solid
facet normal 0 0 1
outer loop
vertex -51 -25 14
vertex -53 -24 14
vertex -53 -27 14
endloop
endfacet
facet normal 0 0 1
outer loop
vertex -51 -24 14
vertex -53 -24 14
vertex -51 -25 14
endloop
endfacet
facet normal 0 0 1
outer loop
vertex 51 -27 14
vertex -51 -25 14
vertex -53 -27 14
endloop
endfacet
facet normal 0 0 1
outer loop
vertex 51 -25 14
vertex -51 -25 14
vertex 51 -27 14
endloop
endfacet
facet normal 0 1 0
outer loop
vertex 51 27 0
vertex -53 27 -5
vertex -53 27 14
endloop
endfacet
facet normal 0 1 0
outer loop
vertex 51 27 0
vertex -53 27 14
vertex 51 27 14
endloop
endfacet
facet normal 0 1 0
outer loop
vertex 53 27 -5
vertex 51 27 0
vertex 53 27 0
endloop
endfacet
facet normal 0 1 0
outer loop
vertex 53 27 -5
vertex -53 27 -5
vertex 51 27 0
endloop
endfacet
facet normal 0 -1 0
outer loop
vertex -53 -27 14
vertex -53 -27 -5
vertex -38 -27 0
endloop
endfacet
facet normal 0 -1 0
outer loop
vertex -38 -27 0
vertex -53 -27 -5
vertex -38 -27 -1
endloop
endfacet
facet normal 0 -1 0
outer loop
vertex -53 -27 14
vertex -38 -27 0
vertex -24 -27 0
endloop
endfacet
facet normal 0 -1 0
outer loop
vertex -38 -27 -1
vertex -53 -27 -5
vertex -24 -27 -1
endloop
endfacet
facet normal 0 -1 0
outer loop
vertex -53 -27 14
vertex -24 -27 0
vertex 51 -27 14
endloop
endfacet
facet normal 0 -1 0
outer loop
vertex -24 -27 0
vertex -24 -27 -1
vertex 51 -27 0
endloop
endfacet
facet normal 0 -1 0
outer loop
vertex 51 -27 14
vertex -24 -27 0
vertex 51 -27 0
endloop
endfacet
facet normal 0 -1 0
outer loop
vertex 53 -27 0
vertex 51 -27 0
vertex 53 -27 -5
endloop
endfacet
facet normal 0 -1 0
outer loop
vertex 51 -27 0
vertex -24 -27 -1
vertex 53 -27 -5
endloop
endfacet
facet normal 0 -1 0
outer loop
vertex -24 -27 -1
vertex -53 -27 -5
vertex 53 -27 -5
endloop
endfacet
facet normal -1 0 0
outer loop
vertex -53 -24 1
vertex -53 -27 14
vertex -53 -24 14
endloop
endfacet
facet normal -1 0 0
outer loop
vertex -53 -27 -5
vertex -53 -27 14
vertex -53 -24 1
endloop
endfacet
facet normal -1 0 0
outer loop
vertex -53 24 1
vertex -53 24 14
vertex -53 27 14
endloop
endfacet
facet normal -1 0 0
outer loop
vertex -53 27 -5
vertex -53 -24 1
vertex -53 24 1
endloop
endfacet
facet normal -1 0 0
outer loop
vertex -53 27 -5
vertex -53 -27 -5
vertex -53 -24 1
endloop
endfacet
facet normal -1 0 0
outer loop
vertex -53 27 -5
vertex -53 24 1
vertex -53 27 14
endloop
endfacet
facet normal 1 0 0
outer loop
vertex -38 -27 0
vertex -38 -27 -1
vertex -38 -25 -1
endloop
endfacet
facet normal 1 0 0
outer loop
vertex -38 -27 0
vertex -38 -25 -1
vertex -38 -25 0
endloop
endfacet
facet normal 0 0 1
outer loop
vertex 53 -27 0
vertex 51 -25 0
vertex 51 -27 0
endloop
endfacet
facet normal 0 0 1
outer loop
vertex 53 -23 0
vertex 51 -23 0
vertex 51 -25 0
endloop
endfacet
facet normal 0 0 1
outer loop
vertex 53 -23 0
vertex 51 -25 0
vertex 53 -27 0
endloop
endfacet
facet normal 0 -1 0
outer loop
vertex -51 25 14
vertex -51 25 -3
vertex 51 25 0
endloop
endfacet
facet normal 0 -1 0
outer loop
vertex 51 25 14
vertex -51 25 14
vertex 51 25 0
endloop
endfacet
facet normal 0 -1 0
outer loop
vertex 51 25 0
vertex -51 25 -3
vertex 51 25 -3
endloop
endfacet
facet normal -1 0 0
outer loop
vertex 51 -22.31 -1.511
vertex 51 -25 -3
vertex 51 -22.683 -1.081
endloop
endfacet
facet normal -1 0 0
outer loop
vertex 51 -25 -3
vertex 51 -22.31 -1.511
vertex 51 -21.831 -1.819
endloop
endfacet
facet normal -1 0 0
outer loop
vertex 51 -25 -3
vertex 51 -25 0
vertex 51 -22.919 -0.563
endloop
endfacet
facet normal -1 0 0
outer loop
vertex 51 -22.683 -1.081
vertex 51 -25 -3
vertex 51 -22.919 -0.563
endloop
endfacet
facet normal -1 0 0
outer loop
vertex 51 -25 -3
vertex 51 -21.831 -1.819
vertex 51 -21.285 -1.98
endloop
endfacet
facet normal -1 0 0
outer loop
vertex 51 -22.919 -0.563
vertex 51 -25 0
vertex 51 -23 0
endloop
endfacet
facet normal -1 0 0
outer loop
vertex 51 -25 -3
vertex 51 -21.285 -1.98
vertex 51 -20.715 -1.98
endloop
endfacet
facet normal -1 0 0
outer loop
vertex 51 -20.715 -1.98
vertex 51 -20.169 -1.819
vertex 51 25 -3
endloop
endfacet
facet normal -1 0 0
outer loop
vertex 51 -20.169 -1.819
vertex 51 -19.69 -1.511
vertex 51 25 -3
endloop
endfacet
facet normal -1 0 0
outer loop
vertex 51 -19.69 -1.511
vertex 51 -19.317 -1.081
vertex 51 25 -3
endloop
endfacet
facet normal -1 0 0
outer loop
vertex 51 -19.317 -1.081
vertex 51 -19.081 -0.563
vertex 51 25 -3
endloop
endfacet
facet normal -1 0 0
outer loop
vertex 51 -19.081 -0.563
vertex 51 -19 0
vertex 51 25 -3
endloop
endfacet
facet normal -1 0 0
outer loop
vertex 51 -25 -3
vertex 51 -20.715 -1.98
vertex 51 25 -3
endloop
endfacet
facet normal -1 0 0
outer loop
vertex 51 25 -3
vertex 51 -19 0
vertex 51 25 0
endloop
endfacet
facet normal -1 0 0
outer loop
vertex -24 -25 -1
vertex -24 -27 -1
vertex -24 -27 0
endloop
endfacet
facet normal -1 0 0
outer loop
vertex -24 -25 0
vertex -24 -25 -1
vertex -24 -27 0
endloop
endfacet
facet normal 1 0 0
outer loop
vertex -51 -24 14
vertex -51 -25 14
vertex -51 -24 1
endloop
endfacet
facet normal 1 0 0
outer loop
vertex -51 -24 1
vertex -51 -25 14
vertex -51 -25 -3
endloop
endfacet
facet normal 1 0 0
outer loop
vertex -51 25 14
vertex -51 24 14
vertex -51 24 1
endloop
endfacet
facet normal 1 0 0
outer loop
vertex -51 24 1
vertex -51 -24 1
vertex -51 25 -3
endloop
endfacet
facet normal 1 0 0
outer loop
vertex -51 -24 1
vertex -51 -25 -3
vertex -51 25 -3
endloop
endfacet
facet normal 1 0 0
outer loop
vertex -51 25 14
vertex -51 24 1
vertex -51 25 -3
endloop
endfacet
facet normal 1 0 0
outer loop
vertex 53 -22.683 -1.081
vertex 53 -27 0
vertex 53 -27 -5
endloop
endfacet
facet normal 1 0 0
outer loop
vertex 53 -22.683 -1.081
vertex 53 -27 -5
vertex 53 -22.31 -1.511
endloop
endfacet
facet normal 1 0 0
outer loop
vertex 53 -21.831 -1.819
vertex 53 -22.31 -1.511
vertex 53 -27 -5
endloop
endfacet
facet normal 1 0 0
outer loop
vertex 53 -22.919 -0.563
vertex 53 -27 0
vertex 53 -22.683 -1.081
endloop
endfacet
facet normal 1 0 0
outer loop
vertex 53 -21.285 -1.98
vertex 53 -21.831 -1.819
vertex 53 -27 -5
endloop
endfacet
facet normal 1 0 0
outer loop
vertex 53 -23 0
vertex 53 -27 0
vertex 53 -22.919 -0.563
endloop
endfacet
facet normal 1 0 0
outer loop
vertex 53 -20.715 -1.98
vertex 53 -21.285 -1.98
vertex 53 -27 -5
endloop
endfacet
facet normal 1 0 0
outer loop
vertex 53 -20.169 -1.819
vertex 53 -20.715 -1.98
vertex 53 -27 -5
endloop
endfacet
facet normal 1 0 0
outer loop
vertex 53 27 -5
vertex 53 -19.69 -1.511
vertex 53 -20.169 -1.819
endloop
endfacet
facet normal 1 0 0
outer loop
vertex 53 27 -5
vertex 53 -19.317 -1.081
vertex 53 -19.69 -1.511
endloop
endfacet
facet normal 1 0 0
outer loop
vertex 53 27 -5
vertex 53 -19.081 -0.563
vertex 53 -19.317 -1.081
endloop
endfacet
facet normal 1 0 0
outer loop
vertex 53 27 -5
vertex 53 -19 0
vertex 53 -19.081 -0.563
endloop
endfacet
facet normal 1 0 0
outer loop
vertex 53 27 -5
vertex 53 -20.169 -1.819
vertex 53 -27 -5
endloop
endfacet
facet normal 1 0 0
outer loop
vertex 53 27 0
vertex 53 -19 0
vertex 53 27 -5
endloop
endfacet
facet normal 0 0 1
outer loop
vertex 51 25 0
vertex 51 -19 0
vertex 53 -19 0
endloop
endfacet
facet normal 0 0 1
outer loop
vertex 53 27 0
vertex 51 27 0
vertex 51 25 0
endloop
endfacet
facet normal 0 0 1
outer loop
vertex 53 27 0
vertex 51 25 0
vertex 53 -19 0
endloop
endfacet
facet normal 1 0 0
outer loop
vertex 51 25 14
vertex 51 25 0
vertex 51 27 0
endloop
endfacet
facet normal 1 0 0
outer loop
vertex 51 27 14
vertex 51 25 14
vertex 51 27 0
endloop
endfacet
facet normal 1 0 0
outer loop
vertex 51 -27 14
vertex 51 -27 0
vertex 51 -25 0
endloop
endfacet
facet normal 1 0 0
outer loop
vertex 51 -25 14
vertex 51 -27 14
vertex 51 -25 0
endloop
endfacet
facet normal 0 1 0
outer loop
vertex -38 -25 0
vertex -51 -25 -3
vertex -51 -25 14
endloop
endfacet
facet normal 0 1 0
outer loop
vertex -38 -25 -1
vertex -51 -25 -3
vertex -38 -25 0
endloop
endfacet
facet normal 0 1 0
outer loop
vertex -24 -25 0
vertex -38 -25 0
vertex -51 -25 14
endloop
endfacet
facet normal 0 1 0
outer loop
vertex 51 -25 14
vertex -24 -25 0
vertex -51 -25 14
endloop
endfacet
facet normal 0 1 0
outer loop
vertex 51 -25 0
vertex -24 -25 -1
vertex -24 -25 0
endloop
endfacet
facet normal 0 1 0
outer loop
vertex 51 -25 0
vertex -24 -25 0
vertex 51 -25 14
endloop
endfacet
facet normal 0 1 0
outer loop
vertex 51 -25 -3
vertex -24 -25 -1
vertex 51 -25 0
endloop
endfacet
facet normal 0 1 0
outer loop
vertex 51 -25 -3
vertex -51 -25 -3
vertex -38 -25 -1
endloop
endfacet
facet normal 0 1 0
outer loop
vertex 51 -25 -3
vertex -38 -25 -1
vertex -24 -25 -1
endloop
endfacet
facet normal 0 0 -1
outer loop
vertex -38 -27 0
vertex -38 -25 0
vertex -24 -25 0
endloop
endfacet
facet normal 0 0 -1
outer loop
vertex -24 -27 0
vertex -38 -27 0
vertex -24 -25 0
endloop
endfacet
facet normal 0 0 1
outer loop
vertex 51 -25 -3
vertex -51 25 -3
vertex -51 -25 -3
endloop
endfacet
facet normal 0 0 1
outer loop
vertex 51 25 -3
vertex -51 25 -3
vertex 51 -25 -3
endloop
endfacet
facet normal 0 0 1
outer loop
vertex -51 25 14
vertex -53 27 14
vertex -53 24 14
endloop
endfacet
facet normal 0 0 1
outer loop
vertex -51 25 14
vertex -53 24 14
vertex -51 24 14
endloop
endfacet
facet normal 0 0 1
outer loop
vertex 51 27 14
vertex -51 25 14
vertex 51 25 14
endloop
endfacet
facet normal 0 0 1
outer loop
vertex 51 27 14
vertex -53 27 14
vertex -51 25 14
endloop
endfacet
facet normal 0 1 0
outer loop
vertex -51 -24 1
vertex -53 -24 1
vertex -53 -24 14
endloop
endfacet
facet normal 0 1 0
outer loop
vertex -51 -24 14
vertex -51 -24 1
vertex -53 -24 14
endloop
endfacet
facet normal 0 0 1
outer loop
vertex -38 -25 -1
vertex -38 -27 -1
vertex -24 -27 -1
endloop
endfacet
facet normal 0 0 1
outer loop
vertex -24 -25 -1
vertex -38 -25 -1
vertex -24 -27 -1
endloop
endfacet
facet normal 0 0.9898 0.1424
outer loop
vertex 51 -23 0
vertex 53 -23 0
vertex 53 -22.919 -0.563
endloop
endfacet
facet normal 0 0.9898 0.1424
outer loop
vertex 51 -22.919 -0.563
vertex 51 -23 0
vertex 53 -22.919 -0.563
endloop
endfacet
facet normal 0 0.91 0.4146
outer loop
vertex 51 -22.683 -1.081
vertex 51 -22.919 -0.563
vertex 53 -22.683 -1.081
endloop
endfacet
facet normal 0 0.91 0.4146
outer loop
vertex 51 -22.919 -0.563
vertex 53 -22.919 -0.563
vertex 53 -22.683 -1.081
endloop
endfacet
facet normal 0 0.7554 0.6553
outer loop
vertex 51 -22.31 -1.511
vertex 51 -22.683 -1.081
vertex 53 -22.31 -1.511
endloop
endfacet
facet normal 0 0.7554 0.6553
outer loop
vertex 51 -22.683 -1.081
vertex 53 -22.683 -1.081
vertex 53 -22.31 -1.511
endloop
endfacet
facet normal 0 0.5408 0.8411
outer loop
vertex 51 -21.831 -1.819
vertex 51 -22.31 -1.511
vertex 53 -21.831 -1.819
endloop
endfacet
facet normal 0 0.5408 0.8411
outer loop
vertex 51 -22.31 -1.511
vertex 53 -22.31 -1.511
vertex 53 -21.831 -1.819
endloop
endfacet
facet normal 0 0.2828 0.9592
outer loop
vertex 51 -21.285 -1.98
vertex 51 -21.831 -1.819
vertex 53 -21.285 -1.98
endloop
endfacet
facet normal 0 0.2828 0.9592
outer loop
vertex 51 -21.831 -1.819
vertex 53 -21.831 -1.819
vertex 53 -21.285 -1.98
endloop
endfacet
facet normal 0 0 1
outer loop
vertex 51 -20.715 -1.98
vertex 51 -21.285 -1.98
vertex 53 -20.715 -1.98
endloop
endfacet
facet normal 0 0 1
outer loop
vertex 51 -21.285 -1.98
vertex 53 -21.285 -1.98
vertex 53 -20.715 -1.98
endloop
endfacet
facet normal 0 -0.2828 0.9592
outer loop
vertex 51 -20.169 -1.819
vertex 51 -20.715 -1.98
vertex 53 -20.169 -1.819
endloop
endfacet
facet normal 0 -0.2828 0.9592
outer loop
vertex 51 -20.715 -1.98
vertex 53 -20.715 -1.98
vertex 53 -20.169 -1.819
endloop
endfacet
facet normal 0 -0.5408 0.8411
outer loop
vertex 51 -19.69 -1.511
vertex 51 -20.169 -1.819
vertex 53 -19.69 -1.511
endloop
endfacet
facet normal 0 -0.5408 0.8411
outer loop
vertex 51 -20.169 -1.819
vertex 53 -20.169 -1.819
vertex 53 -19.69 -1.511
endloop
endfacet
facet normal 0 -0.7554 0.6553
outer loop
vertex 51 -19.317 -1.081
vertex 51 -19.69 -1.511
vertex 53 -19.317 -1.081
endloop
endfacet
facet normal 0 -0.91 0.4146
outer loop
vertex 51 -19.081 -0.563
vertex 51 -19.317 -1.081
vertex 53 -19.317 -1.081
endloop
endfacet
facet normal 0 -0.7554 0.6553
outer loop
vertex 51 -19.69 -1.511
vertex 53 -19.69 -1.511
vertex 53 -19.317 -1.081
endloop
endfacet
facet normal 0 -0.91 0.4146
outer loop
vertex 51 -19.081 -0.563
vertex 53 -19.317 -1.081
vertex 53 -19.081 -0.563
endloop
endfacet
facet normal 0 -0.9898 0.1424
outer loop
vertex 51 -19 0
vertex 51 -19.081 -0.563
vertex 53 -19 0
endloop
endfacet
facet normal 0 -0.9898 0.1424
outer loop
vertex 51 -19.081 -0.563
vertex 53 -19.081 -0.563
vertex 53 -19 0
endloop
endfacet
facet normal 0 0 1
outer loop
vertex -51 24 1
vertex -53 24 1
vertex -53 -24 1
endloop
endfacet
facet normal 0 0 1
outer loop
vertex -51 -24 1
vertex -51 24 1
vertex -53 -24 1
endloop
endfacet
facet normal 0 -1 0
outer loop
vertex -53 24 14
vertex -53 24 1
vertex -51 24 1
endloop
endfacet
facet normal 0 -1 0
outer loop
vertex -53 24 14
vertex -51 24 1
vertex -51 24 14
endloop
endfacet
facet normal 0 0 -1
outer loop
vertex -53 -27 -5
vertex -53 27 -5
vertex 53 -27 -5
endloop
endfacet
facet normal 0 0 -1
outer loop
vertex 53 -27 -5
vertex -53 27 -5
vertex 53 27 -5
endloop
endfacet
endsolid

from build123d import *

# Parameters (mm, degrees)
SKETCH001_W     = 106
SKETCH001_H     = 54
PAD_DEPTH       = 5
SKETCH_W        = 102
SKETCH_H        = 50
POCKET_DEPTH    = 3
SKETCH002_R     = 2
POCKET001_DEPTH = 2
SKETCH004_W     = 14
SKETCH004_H     = 3
POCKET002_DEPTH = 5
SKETCH005_W     = 2
SKETCH005_H     = 54
PAD001_DEPTH    = 14
SKETCH006_W     = 48
SKETCH006_H     = 13
POCKET003_DEPTH = 2
SKETCH007_W     = 102
SKETCH007_H     = 2
PAD002_DEPTH    = 14
SKETCH008_W     = 102
SKETCH008_H     = 2
PAD003_DEPTH    = 14


with BuildPart() as part:
    # Sketch001 → Pad (new body)
    with BuildSketch(Plane.XY):
        Rectangle(SKETCH001_W, SKETCH001_H)
    extrude(amount=-PAD_DEPTH)

    # Sketch → Pocket (cut)
    with BuildSketch(Plane.XY):
        Rectangle(SKETCH_W, SKETCH_H)
    extrude(amount=-POCKET_DEPTH, mode=Mode.SUBTRACT)

    # Sketch002 (on Face3 of Pocket) → Pocket001 (cut)
    with BuildSketch(Plane.YZ.offset(53)):
        with Locations((-21, 0)):
            Circle(SKETCH002_R)
    extrude(amount=-POCKET001_DEPTH, mode=Mode.SUBTRACT)

    # Sketch004 (on Face6 of Pocket) → Pocket002 (cut)
    with BuildSketch(Plane.XZ.offset(27)):
        with Locations((-31, 0.5)):
            Rectangle(SKETCH004_W, SKETCH004_H)
    extrude(amount=-POCKET002_DEPTH, mode=Mode.SUBTRACT)

    # Sketch005 (on Face4 of Pocket002) → Pad001 (join)
    with BuildSketch(Plane.XY):
        with Locations((-52, 0)):
            Rectangle(SKETCH005_W, SKETCH005_H)
    extrude(amount=PAD001_DEPTH)

    # Sketch006 (on Face8 of Pad001) → Pocket003 (cut)
    with BuildSketch(Plane(origin=(-53, 0, 0), x_dir=(0, -1, 0), z_dir=(-1, 0, 0))):
        with Locations((0, 7.5)):
            Rectangle(SKETCH006_W, SKETCH006_H)
    extrude(amount=-POCKET003_DEPTH, mode=Mode.SUBTRACT)

    # Sketch007 (on Face5 of Pocket003) → Pad002 (join)
    with BuildSketch(Plane.XY):
        with Locations((0, 26)):
            Rectangle(SKETCH007_W, SKETCH007_H)
    extrude(amount=PAD002_DEPTH)

    # Sketch008 (on Face11 of Pad002) → Pad003 (join)
    with BuildSketch(Plane.XY):
        with Locations((0, -26)):
            Rectangle(SKETCH008_W, SKETCH008_H)
    extrude(amount=PAD003_DEPTH)


solid = part.part
